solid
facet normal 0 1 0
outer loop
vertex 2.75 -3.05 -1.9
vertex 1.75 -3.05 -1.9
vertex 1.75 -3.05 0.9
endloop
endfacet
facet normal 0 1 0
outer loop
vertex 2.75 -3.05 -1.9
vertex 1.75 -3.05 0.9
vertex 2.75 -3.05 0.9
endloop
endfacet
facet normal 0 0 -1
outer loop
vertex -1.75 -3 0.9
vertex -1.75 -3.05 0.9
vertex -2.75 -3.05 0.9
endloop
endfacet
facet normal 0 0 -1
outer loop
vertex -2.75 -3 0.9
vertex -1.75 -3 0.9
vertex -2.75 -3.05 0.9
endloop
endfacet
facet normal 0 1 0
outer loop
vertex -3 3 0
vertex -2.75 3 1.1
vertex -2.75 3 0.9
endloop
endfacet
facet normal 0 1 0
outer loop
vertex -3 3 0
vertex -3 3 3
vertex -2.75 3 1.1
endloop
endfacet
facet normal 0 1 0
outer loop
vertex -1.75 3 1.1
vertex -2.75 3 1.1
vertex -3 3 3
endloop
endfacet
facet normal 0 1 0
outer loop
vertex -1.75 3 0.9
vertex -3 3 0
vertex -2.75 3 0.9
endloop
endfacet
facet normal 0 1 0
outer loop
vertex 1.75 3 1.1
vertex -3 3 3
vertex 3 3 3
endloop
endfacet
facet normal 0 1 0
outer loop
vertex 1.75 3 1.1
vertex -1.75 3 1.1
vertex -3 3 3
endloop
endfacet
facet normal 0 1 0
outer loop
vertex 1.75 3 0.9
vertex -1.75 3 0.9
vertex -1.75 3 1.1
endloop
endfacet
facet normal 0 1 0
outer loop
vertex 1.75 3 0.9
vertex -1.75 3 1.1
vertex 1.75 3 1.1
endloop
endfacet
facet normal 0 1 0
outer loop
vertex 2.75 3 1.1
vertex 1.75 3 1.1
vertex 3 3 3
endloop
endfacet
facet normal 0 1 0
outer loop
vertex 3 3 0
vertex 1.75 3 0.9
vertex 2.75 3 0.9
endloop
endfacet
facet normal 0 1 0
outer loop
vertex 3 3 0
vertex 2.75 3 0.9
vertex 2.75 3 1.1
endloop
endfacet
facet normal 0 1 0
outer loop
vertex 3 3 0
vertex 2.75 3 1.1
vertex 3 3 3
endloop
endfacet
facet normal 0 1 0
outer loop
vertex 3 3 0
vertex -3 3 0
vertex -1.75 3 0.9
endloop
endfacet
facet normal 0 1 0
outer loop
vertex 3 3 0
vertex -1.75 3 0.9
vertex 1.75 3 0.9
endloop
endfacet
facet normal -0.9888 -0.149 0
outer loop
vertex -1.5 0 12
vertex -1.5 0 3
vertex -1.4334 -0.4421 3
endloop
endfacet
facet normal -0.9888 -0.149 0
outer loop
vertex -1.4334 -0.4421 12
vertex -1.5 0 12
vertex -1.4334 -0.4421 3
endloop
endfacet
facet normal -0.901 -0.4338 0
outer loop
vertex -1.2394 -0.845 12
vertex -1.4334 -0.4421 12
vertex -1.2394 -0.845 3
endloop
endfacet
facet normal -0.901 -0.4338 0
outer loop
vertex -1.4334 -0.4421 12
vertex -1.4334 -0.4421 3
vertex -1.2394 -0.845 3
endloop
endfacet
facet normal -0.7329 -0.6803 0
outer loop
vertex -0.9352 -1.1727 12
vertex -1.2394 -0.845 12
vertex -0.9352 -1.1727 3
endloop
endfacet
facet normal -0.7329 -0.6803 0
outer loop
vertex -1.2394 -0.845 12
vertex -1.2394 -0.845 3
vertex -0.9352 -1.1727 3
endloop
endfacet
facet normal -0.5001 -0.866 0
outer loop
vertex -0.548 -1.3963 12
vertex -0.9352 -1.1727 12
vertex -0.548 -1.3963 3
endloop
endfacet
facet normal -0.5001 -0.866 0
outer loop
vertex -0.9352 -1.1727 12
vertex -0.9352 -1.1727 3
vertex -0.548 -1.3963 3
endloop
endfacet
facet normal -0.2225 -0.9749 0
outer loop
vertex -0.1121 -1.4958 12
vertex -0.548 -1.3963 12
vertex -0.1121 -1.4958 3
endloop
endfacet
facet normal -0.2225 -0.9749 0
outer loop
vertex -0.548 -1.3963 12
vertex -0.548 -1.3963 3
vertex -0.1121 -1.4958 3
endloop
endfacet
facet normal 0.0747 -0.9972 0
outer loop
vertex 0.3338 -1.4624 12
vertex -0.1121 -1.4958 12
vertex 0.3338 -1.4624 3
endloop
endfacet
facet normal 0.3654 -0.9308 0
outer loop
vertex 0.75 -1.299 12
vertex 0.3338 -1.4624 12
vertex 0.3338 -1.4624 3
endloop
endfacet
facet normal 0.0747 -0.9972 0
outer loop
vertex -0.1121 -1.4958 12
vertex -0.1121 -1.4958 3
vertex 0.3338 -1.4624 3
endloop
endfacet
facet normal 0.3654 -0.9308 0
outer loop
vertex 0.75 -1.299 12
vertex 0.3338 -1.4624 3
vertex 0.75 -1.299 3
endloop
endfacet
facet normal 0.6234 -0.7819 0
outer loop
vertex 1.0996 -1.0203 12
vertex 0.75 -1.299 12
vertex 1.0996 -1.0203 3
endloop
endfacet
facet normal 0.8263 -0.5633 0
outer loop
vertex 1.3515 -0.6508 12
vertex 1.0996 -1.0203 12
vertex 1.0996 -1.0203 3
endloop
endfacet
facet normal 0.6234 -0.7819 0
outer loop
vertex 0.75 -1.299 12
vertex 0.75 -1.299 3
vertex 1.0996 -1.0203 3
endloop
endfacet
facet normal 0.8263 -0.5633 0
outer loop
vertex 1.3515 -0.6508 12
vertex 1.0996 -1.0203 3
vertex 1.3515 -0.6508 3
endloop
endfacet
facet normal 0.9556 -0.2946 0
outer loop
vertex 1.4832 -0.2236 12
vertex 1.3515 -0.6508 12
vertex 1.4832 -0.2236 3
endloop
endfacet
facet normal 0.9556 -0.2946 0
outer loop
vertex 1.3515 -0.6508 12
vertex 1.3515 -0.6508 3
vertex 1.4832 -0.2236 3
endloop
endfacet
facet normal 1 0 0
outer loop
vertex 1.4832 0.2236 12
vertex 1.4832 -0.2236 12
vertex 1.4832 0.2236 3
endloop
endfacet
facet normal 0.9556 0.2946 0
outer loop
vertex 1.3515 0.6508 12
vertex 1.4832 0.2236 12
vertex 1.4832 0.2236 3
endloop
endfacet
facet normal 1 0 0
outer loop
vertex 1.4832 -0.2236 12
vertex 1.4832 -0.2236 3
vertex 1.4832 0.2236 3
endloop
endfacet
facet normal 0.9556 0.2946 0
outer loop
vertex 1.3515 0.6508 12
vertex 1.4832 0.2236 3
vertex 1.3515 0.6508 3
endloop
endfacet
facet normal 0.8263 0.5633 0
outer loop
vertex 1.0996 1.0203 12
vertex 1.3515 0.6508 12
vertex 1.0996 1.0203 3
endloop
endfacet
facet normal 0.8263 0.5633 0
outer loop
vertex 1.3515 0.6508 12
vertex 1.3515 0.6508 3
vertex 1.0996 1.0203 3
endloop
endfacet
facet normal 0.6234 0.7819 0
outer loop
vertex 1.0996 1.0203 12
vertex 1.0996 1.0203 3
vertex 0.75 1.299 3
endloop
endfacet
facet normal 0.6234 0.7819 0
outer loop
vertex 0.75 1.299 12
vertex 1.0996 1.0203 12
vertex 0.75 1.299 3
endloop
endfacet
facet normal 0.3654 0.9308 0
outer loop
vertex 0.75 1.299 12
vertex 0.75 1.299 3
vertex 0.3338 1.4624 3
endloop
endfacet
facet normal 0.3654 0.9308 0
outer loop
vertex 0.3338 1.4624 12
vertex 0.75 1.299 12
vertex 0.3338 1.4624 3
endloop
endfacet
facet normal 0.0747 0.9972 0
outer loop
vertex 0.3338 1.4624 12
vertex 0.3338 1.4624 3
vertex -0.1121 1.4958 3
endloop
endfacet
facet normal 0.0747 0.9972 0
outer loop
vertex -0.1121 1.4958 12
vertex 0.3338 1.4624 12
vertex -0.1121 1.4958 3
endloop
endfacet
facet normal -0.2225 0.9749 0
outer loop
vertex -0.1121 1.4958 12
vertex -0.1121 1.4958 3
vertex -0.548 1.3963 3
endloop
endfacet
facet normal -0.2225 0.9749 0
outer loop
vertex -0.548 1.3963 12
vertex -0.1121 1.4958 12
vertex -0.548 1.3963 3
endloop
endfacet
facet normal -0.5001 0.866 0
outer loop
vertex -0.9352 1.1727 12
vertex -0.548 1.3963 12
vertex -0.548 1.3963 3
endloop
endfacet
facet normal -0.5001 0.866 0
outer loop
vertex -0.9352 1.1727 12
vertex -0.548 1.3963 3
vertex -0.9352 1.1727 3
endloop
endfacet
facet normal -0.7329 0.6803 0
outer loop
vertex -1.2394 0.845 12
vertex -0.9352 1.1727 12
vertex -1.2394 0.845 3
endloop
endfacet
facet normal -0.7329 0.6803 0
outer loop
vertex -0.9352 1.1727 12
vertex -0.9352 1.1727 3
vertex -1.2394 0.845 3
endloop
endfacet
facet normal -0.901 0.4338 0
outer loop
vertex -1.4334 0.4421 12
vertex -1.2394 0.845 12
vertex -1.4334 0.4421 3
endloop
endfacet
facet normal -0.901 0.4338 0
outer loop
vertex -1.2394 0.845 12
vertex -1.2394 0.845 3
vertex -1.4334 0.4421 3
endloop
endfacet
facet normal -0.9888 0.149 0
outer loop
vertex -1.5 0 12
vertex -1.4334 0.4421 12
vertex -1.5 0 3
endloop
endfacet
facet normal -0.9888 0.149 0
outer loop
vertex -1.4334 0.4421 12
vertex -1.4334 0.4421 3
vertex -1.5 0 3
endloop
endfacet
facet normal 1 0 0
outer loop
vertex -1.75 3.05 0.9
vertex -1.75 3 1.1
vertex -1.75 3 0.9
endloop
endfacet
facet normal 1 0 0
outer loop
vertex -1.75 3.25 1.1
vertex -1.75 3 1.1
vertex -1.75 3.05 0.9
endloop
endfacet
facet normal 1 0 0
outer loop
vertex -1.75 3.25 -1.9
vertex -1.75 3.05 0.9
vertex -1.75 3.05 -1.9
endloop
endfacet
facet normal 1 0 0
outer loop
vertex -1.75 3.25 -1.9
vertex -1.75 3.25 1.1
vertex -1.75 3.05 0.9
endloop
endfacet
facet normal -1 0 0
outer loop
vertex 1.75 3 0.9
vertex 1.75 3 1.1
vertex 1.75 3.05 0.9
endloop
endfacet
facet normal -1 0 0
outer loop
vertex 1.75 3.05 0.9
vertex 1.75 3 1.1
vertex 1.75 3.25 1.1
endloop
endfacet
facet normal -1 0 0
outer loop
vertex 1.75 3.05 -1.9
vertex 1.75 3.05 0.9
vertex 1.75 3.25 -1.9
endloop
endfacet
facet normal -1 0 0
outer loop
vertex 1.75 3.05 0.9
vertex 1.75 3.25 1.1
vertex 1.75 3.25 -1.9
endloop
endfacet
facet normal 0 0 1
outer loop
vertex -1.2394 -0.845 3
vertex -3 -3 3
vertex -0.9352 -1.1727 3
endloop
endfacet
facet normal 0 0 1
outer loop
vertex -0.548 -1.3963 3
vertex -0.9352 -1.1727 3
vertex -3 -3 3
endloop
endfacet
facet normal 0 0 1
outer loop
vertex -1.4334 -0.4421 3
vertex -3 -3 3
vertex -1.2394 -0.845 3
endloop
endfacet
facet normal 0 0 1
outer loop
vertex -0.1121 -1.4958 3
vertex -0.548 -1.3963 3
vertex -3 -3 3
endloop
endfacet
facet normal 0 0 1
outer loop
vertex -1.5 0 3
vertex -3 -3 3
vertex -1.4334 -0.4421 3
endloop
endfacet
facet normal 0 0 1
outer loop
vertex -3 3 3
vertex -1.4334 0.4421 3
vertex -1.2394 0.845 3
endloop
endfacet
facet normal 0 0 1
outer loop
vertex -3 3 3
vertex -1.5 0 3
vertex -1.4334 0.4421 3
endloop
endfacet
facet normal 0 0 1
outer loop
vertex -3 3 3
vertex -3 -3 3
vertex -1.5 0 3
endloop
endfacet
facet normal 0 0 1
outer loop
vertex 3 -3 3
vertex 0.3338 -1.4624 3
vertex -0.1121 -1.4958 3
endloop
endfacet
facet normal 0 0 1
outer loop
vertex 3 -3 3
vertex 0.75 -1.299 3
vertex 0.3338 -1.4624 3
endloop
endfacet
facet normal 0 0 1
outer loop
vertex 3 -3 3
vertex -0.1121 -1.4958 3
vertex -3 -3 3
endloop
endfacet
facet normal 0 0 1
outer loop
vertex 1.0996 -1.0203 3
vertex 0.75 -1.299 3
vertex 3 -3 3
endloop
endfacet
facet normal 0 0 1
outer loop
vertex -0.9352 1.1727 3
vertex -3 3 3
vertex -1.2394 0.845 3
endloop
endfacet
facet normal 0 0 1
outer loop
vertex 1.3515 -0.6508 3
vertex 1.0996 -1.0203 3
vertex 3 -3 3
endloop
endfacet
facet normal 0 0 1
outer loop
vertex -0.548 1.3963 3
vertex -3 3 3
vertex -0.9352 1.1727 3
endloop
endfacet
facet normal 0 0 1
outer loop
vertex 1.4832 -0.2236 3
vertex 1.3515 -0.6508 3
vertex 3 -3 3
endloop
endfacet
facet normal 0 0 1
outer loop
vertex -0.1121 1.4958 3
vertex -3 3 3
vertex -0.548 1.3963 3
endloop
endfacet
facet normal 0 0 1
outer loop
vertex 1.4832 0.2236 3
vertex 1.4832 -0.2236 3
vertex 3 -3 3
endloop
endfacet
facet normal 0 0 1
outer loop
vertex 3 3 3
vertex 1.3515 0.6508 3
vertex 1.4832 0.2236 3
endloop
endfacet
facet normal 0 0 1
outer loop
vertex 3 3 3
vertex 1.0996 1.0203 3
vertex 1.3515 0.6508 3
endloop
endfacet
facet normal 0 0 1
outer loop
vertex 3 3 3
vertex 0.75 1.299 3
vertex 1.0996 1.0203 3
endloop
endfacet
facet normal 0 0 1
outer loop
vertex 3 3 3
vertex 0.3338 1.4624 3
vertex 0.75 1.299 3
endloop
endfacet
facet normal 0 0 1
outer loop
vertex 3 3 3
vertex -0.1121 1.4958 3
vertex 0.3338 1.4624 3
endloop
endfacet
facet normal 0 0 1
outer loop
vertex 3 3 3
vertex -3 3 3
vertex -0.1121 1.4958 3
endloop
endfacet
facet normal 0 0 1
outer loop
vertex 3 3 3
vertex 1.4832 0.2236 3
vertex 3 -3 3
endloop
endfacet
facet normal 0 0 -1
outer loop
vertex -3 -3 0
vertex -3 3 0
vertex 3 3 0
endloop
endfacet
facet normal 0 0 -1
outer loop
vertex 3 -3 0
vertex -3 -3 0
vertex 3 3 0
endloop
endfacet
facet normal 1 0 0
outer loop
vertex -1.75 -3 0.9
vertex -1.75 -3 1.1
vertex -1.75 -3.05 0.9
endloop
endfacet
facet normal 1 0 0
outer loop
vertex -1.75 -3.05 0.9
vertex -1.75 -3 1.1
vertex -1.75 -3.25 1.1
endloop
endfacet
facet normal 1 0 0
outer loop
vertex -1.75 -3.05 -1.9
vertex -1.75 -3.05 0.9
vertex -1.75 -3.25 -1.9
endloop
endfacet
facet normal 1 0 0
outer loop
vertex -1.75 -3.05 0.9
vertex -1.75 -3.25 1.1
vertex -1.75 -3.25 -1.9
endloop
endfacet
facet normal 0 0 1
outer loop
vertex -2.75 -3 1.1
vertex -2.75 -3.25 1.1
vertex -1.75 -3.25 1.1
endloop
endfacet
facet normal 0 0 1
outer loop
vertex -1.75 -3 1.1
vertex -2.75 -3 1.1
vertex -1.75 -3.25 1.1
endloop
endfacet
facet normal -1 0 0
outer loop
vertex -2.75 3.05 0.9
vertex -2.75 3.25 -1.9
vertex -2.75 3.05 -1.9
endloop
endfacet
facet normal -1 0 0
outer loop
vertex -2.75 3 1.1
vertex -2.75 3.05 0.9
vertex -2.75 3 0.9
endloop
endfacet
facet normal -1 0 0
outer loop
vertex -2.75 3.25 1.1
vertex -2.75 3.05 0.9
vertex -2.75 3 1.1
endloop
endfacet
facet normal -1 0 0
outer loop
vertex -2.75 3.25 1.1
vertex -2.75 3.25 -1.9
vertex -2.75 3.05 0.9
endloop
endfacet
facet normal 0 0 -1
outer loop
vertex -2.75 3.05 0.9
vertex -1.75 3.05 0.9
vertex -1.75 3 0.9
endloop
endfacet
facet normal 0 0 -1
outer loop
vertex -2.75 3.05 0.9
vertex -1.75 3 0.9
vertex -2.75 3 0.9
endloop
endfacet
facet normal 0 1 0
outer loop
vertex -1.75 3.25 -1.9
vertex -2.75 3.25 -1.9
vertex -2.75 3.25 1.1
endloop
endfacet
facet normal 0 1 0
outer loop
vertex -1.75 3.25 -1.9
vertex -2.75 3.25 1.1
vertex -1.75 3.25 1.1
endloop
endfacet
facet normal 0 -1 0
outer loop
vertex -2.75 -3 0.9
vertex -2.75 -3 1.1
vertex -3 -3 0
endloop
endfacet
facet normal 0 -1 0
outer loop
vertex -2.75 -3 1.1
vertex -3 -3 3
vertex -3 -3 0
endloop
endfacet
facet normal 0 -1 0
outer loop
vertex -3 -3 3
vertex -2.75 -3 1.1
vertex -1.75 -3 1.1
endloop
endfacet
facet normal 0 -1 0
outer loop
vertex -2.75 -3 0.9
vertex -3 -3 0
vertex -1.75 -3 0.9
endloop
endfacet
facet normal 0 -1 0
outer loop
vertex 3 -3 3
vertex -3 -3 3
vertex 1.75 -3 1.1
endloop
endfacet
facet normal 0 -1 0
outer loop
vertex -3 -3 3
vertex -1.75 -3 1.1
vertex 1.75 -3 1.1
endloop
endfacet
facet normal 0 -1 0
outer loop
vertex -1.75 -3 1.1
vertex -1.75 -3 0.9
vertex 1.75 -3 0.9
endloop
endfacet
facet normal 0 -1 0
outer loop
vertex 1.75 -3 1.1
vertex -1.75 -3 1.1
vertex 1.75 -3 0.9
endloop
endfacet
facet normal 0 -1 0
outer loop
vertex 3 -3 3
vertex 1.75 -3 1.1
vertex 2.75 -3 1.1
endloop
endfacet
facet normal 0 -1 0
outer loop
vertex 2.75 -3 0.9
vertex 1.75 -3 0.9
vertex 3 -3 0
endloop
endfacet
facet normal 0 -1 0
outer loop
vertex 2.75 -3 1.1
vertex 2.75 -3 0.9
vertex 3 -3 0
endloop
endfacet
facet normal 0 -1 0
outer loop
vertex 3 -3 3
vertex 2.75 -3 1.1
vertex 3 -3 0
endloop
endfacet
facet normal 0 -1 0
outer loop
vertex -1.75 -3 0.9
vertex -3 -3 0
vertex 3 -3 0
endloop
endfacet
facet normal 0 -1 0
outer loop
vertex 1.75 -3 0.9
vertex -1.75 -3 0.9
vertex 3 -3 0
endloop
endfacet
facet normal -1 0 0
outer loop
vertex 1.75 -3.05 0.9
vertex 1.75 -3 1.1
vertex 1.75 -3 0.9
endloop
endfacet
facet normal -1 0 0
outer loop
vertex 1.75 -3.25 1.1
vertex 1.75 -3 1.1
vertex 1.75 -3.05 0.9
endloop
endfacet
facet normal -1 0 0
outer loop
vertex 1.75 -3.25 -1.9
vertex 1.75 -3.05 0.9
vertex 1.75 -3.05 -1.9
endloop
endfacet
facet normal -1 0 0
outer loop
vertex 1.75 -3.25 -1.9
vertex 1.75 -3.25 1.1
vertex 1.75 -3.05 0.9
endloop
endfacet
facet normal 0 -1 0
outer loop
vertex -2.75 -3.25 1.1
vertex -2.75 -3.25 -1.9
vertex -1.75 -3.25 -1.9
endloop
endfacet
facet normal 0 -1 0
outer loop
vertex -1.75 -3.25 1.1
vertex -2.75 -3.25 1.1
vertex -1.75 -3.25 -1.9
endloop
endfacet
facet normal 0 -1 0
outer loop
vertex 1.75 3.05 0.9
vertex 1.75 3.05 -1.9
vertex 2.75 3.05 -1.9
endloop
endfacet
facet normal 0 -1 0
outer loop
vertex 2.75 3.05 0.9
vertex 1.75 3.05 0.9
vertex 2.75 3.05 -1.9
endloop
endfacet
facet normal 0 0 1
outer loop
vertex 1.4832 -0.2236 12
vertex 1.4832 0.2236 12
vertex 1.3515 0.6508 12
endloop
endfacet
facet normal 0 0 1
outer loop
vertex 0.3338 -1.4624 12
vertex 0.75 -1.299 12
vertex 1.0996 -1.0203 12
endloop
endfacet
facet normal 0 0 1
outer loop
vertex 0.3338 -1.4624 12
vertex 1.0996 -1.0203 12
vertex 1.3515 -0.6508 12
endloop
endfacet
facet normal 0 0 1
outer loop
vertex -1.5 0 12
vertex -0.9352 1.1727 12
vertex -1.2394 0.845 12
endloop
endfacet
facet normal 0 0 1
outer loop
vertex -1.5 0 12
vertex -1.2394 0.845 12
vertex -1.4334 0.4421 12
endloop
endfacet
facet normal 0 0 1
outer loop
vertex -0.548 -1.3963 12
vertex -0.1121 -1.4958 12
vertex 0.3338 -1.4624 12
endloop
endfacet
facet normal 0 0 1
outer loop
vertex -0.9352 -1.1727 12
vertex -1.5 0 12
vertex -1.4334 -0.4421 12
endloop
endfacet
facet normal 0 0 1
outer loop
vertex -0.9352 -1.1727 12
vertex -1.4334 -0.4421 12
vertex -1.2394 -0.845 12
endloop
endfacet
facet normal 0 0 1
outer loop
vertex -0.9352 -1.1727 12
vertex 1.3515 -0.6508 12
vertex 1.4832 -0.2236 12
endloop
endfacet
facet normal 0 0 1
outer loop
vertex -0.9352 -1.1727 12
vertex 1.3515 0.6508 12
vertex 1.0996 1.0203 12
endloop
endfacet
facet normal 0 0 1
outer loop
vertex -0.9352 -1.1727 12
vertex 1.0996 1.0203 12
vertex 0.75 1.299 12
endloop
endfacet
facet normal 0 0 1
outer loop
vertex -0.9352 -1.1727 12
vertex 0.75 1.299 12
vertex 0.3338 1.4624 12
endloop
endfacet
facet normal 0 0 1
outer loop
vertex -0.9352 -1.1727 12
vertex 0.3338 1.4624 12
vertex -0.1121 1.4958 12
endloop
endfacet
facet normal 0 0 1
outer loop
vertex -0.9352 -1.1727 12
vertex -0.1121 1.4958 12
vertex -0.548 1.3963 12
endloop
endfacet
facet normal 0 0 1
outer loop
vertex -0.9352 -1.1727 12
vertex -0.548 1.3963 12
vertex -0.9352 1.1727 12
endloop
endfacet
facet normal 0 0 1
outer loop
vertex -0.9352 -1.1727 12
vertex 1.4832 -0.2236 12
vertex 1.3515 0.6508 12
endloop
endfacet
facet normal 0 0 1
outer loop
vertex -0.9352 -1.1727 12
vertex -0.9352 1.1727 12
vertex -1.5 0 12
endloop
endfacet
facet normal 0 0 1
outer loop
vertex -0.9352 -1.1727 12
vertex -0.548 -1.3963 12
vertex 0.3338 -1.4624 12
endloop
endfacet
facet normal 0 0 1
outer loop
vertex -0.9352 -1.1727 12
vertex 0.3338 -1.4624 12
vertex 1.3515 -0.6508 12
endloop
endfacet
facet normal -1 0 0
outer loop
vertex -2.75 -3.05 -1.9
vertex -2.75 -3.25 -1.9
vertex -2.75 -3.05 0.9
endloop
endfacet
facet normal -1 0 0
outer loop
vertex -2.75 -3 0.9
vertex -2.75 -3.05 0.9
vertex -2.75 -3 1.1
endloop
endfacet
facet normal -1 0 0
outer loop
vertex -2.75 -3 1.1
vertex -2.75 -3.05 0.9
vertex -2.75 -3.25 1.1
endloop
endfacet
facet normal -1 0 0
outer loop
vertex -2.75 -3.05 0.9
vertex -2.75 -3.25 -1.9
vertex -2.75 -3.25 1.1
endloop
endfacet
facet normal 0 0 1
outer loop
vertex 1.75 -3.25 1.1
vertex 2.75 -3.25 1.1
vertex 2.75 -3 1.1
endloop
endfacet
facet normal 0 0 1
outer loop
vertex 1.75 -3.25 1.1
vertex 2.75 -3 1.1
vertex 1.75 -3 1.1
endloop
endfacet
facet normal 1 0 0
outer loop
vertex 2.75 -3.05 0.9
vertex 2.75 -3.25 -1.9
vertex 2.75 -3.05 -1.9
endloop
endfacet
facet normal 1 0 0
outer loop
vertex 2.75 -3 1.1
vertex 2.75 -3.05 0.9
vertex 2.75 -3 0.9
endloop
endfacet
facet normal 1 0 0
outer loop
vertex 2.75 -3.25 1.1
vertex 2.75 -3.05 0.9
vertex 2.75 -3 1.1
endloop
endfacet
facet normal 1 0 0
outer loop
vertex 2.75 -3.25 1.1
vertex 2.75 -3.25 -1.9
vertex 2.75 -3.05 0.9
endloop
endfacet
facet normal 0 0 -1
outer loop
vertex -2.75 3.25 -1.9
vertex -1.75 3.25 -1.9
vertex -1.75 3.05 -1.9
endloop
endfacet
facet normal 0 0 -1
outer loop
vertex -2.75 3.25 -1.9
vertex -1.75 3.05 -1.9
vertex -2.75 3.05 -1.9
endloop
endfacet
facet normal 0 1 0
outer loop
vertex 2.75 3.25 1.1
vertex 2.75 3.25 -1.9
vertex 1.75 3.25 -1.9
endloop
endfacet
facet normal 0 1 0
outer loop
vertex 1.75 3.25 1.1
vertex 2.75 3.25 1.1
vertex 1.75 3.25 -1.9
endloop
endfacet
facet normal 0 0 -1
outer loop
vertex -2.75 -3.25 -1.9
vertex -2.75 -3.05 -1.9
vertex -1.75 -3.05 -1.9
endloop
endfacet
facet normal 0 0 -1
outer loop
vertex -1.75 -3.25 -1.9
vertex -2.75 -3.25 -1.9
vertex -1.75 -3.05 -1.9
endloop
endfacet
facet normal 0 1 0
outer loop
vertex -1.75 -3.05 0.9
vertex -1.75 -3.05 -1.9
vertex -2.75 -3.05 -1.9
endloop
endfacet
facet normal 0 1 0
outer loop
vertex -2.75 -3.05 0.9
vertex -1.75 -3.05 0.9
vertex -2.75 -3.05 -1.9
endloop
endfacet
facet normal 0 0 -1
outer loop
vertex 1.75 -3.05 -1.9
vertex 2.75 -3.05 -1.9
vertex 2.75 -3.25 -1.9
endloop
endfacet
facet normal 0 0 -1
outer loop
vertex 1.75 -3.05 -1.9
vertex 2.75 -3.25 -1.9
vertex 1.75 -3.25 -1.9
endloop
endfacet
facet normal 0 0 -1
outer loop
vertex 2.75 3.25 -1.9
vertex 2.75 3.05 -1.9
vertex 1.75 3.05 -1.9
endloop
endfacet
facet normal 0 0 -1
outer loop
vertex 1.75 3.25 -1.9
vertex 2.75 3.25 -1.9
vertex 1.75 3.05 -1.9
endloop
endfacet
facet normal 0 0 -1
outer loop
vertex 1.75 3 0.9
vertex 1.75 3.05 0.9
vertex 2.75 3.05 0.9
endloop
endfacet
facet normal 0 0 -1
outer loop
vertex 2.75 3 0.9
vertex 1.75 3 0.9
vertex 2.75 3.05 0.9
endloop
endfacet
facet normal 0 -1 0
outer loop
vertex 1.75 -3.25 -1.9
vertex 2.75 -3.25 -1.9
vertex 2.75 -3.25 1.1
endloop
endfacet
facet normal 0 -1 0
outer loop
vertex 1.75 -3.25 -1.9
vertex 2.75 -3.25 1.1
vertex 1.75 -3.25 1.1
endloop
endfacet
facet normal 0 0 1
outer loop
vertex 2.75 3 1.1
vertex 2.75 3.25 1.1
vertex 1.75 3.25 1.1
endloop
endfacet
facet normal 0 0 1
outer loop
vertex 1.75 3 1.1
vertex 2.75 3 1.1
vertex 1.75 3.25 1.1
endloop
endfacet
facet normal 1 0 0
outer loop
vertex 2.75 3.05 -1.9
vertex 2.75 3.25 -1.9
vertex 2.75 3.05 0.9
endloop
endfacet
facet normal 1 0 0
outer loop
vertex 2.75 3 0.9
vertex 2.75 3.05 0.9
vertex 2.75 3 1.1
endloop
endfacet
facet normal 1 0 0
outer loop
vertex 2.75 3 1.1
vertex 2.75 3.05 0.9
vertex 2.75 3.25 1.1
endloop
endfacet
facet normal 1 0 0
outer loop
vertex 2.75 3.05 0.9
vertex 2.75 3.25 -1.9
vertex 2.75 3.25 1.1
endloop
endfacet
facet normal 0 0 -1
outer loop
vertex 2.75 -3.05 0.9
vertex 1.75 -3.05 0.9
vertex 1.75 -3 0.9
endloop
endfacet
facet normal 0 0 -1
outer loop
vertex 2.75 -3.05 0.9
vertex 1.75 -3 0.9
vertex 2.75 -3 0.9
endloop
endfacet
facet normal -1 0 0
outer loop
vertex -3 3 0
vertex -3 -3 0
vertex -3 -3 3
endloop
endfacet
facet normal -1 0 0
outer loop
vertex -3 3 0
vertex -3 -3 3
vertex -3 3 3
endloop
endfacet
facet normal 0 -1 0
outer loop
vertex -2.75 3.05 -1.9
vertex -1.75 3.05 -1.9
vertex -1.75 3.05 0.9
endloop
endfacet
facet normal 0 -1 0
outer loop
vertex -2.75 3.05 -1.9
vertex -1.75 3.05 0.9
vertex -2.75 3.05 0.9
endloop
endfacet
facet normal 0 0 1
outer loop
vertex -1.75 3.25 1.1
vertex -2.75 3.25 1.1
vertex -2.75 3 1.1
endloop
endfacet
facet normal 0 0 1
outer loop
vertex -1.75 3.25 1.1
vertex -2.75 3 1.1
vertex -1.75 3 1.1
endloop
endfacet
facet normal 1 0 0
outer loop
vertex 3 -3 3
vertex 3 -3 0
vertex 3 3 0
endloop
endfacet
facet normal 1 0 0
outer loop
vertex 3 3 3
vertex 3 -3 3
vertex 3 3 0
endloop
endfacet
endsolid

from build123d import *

# Parameters (mm, degrees)
SKETCH_1_W               = 6
SKETCH_1_H               = 6
EXTRUDE_1_DEPTH          = 3
SKETCH_2_R               = 1.5
EXTRUDE_2_DEPTH          = 9
SKETCH_4_W               = 1
SKETCH_4_H               = 0.2
MIRROR_2_COPY_1_SKETCH_W = 1
MIRROR_2_COPY_1_SKETCH_H = 0.2


with BuildPart() as part:
    # 草图1 → 凸台-拉伸1 (new body)
    with BuildSketch(Plane.XY):
        Rectangle(SKETCH_1_W, SKETCH_1_H)
    extrude(amount=EXTRUDE_1_DEPTH)

    # 草图2 → 凸台-拉伸2 (add)
    with BuildSketch(Plane.XY.offset(3)):
        with Locations(Location((0, 0, 0), (0, 0, 180))):
            Circle(SKETCH_2_R)
    extrude(amount=EXTRUDE_2_DEPTH)

    # 扫描3: sweep along a path in 草图6
    with BuildLine(Plane(origin=(2.25, 0, 0), x_dir=(0, 0, -1), z_dir=(1, 0, 0))) as sweep_3_path:
        Line((-1.1, -3), (-1.1, -3.25))
        Line((-1.1, -3.25), (1.9, -3.25))
    # 草图4 → 扫描3 (sweep)
    with BuildSketch(Plane.XZ.offset(3)):
        with Locations((2.25, 1)):
            Rectangle(SKETCH_4_W, SKETCH_4_H)
    sweep_3 = sweep(path=sweep_3_path.line, transition=Transition.RIGHT)

    # 镜向1: 扫描3 across plane
    add(sweep_3.mirror(Plane(origin=(0, 0, 0), x_dir=(0, 0, 1), z_dir=(1, 0, 0))))

    # 镜向2: 扫描3 across plane
    add(sweep_3.mirror(Plane.ZX))

    # 镜向2 copy 1: sweep along a path in 镜向2 copy 1 path
    with BuildLine(Plane(origin=(-2.25, 0, 0), x_dir=(0, 0, -1), z_dir=(-1, 0, 0))) as mirror_2_copy_1_path:
        Line((-1.1, -3), (-1.1, -3.25))
        Line((-1.1, -3.25), (1.9, -3.25))
    # 镜向2 copy 1 sketch → 镜向2 copy 1 (sweep)
    with BuildSketch(Plane(origin=(0, 3, 0), x_dir=(-1, 0, 0), z_dir=(0, 1, 0))):
        with Locations((2.25, 1)):
            Rectangle(MIRROR_2_COPY_1_SKETCH_W, MIRROR_2_COPY_1_SKETCH_H)
    sweep(path=mirror_2_copy_1_path.line, transition=Transition.RIGHT)


solid = part.part
